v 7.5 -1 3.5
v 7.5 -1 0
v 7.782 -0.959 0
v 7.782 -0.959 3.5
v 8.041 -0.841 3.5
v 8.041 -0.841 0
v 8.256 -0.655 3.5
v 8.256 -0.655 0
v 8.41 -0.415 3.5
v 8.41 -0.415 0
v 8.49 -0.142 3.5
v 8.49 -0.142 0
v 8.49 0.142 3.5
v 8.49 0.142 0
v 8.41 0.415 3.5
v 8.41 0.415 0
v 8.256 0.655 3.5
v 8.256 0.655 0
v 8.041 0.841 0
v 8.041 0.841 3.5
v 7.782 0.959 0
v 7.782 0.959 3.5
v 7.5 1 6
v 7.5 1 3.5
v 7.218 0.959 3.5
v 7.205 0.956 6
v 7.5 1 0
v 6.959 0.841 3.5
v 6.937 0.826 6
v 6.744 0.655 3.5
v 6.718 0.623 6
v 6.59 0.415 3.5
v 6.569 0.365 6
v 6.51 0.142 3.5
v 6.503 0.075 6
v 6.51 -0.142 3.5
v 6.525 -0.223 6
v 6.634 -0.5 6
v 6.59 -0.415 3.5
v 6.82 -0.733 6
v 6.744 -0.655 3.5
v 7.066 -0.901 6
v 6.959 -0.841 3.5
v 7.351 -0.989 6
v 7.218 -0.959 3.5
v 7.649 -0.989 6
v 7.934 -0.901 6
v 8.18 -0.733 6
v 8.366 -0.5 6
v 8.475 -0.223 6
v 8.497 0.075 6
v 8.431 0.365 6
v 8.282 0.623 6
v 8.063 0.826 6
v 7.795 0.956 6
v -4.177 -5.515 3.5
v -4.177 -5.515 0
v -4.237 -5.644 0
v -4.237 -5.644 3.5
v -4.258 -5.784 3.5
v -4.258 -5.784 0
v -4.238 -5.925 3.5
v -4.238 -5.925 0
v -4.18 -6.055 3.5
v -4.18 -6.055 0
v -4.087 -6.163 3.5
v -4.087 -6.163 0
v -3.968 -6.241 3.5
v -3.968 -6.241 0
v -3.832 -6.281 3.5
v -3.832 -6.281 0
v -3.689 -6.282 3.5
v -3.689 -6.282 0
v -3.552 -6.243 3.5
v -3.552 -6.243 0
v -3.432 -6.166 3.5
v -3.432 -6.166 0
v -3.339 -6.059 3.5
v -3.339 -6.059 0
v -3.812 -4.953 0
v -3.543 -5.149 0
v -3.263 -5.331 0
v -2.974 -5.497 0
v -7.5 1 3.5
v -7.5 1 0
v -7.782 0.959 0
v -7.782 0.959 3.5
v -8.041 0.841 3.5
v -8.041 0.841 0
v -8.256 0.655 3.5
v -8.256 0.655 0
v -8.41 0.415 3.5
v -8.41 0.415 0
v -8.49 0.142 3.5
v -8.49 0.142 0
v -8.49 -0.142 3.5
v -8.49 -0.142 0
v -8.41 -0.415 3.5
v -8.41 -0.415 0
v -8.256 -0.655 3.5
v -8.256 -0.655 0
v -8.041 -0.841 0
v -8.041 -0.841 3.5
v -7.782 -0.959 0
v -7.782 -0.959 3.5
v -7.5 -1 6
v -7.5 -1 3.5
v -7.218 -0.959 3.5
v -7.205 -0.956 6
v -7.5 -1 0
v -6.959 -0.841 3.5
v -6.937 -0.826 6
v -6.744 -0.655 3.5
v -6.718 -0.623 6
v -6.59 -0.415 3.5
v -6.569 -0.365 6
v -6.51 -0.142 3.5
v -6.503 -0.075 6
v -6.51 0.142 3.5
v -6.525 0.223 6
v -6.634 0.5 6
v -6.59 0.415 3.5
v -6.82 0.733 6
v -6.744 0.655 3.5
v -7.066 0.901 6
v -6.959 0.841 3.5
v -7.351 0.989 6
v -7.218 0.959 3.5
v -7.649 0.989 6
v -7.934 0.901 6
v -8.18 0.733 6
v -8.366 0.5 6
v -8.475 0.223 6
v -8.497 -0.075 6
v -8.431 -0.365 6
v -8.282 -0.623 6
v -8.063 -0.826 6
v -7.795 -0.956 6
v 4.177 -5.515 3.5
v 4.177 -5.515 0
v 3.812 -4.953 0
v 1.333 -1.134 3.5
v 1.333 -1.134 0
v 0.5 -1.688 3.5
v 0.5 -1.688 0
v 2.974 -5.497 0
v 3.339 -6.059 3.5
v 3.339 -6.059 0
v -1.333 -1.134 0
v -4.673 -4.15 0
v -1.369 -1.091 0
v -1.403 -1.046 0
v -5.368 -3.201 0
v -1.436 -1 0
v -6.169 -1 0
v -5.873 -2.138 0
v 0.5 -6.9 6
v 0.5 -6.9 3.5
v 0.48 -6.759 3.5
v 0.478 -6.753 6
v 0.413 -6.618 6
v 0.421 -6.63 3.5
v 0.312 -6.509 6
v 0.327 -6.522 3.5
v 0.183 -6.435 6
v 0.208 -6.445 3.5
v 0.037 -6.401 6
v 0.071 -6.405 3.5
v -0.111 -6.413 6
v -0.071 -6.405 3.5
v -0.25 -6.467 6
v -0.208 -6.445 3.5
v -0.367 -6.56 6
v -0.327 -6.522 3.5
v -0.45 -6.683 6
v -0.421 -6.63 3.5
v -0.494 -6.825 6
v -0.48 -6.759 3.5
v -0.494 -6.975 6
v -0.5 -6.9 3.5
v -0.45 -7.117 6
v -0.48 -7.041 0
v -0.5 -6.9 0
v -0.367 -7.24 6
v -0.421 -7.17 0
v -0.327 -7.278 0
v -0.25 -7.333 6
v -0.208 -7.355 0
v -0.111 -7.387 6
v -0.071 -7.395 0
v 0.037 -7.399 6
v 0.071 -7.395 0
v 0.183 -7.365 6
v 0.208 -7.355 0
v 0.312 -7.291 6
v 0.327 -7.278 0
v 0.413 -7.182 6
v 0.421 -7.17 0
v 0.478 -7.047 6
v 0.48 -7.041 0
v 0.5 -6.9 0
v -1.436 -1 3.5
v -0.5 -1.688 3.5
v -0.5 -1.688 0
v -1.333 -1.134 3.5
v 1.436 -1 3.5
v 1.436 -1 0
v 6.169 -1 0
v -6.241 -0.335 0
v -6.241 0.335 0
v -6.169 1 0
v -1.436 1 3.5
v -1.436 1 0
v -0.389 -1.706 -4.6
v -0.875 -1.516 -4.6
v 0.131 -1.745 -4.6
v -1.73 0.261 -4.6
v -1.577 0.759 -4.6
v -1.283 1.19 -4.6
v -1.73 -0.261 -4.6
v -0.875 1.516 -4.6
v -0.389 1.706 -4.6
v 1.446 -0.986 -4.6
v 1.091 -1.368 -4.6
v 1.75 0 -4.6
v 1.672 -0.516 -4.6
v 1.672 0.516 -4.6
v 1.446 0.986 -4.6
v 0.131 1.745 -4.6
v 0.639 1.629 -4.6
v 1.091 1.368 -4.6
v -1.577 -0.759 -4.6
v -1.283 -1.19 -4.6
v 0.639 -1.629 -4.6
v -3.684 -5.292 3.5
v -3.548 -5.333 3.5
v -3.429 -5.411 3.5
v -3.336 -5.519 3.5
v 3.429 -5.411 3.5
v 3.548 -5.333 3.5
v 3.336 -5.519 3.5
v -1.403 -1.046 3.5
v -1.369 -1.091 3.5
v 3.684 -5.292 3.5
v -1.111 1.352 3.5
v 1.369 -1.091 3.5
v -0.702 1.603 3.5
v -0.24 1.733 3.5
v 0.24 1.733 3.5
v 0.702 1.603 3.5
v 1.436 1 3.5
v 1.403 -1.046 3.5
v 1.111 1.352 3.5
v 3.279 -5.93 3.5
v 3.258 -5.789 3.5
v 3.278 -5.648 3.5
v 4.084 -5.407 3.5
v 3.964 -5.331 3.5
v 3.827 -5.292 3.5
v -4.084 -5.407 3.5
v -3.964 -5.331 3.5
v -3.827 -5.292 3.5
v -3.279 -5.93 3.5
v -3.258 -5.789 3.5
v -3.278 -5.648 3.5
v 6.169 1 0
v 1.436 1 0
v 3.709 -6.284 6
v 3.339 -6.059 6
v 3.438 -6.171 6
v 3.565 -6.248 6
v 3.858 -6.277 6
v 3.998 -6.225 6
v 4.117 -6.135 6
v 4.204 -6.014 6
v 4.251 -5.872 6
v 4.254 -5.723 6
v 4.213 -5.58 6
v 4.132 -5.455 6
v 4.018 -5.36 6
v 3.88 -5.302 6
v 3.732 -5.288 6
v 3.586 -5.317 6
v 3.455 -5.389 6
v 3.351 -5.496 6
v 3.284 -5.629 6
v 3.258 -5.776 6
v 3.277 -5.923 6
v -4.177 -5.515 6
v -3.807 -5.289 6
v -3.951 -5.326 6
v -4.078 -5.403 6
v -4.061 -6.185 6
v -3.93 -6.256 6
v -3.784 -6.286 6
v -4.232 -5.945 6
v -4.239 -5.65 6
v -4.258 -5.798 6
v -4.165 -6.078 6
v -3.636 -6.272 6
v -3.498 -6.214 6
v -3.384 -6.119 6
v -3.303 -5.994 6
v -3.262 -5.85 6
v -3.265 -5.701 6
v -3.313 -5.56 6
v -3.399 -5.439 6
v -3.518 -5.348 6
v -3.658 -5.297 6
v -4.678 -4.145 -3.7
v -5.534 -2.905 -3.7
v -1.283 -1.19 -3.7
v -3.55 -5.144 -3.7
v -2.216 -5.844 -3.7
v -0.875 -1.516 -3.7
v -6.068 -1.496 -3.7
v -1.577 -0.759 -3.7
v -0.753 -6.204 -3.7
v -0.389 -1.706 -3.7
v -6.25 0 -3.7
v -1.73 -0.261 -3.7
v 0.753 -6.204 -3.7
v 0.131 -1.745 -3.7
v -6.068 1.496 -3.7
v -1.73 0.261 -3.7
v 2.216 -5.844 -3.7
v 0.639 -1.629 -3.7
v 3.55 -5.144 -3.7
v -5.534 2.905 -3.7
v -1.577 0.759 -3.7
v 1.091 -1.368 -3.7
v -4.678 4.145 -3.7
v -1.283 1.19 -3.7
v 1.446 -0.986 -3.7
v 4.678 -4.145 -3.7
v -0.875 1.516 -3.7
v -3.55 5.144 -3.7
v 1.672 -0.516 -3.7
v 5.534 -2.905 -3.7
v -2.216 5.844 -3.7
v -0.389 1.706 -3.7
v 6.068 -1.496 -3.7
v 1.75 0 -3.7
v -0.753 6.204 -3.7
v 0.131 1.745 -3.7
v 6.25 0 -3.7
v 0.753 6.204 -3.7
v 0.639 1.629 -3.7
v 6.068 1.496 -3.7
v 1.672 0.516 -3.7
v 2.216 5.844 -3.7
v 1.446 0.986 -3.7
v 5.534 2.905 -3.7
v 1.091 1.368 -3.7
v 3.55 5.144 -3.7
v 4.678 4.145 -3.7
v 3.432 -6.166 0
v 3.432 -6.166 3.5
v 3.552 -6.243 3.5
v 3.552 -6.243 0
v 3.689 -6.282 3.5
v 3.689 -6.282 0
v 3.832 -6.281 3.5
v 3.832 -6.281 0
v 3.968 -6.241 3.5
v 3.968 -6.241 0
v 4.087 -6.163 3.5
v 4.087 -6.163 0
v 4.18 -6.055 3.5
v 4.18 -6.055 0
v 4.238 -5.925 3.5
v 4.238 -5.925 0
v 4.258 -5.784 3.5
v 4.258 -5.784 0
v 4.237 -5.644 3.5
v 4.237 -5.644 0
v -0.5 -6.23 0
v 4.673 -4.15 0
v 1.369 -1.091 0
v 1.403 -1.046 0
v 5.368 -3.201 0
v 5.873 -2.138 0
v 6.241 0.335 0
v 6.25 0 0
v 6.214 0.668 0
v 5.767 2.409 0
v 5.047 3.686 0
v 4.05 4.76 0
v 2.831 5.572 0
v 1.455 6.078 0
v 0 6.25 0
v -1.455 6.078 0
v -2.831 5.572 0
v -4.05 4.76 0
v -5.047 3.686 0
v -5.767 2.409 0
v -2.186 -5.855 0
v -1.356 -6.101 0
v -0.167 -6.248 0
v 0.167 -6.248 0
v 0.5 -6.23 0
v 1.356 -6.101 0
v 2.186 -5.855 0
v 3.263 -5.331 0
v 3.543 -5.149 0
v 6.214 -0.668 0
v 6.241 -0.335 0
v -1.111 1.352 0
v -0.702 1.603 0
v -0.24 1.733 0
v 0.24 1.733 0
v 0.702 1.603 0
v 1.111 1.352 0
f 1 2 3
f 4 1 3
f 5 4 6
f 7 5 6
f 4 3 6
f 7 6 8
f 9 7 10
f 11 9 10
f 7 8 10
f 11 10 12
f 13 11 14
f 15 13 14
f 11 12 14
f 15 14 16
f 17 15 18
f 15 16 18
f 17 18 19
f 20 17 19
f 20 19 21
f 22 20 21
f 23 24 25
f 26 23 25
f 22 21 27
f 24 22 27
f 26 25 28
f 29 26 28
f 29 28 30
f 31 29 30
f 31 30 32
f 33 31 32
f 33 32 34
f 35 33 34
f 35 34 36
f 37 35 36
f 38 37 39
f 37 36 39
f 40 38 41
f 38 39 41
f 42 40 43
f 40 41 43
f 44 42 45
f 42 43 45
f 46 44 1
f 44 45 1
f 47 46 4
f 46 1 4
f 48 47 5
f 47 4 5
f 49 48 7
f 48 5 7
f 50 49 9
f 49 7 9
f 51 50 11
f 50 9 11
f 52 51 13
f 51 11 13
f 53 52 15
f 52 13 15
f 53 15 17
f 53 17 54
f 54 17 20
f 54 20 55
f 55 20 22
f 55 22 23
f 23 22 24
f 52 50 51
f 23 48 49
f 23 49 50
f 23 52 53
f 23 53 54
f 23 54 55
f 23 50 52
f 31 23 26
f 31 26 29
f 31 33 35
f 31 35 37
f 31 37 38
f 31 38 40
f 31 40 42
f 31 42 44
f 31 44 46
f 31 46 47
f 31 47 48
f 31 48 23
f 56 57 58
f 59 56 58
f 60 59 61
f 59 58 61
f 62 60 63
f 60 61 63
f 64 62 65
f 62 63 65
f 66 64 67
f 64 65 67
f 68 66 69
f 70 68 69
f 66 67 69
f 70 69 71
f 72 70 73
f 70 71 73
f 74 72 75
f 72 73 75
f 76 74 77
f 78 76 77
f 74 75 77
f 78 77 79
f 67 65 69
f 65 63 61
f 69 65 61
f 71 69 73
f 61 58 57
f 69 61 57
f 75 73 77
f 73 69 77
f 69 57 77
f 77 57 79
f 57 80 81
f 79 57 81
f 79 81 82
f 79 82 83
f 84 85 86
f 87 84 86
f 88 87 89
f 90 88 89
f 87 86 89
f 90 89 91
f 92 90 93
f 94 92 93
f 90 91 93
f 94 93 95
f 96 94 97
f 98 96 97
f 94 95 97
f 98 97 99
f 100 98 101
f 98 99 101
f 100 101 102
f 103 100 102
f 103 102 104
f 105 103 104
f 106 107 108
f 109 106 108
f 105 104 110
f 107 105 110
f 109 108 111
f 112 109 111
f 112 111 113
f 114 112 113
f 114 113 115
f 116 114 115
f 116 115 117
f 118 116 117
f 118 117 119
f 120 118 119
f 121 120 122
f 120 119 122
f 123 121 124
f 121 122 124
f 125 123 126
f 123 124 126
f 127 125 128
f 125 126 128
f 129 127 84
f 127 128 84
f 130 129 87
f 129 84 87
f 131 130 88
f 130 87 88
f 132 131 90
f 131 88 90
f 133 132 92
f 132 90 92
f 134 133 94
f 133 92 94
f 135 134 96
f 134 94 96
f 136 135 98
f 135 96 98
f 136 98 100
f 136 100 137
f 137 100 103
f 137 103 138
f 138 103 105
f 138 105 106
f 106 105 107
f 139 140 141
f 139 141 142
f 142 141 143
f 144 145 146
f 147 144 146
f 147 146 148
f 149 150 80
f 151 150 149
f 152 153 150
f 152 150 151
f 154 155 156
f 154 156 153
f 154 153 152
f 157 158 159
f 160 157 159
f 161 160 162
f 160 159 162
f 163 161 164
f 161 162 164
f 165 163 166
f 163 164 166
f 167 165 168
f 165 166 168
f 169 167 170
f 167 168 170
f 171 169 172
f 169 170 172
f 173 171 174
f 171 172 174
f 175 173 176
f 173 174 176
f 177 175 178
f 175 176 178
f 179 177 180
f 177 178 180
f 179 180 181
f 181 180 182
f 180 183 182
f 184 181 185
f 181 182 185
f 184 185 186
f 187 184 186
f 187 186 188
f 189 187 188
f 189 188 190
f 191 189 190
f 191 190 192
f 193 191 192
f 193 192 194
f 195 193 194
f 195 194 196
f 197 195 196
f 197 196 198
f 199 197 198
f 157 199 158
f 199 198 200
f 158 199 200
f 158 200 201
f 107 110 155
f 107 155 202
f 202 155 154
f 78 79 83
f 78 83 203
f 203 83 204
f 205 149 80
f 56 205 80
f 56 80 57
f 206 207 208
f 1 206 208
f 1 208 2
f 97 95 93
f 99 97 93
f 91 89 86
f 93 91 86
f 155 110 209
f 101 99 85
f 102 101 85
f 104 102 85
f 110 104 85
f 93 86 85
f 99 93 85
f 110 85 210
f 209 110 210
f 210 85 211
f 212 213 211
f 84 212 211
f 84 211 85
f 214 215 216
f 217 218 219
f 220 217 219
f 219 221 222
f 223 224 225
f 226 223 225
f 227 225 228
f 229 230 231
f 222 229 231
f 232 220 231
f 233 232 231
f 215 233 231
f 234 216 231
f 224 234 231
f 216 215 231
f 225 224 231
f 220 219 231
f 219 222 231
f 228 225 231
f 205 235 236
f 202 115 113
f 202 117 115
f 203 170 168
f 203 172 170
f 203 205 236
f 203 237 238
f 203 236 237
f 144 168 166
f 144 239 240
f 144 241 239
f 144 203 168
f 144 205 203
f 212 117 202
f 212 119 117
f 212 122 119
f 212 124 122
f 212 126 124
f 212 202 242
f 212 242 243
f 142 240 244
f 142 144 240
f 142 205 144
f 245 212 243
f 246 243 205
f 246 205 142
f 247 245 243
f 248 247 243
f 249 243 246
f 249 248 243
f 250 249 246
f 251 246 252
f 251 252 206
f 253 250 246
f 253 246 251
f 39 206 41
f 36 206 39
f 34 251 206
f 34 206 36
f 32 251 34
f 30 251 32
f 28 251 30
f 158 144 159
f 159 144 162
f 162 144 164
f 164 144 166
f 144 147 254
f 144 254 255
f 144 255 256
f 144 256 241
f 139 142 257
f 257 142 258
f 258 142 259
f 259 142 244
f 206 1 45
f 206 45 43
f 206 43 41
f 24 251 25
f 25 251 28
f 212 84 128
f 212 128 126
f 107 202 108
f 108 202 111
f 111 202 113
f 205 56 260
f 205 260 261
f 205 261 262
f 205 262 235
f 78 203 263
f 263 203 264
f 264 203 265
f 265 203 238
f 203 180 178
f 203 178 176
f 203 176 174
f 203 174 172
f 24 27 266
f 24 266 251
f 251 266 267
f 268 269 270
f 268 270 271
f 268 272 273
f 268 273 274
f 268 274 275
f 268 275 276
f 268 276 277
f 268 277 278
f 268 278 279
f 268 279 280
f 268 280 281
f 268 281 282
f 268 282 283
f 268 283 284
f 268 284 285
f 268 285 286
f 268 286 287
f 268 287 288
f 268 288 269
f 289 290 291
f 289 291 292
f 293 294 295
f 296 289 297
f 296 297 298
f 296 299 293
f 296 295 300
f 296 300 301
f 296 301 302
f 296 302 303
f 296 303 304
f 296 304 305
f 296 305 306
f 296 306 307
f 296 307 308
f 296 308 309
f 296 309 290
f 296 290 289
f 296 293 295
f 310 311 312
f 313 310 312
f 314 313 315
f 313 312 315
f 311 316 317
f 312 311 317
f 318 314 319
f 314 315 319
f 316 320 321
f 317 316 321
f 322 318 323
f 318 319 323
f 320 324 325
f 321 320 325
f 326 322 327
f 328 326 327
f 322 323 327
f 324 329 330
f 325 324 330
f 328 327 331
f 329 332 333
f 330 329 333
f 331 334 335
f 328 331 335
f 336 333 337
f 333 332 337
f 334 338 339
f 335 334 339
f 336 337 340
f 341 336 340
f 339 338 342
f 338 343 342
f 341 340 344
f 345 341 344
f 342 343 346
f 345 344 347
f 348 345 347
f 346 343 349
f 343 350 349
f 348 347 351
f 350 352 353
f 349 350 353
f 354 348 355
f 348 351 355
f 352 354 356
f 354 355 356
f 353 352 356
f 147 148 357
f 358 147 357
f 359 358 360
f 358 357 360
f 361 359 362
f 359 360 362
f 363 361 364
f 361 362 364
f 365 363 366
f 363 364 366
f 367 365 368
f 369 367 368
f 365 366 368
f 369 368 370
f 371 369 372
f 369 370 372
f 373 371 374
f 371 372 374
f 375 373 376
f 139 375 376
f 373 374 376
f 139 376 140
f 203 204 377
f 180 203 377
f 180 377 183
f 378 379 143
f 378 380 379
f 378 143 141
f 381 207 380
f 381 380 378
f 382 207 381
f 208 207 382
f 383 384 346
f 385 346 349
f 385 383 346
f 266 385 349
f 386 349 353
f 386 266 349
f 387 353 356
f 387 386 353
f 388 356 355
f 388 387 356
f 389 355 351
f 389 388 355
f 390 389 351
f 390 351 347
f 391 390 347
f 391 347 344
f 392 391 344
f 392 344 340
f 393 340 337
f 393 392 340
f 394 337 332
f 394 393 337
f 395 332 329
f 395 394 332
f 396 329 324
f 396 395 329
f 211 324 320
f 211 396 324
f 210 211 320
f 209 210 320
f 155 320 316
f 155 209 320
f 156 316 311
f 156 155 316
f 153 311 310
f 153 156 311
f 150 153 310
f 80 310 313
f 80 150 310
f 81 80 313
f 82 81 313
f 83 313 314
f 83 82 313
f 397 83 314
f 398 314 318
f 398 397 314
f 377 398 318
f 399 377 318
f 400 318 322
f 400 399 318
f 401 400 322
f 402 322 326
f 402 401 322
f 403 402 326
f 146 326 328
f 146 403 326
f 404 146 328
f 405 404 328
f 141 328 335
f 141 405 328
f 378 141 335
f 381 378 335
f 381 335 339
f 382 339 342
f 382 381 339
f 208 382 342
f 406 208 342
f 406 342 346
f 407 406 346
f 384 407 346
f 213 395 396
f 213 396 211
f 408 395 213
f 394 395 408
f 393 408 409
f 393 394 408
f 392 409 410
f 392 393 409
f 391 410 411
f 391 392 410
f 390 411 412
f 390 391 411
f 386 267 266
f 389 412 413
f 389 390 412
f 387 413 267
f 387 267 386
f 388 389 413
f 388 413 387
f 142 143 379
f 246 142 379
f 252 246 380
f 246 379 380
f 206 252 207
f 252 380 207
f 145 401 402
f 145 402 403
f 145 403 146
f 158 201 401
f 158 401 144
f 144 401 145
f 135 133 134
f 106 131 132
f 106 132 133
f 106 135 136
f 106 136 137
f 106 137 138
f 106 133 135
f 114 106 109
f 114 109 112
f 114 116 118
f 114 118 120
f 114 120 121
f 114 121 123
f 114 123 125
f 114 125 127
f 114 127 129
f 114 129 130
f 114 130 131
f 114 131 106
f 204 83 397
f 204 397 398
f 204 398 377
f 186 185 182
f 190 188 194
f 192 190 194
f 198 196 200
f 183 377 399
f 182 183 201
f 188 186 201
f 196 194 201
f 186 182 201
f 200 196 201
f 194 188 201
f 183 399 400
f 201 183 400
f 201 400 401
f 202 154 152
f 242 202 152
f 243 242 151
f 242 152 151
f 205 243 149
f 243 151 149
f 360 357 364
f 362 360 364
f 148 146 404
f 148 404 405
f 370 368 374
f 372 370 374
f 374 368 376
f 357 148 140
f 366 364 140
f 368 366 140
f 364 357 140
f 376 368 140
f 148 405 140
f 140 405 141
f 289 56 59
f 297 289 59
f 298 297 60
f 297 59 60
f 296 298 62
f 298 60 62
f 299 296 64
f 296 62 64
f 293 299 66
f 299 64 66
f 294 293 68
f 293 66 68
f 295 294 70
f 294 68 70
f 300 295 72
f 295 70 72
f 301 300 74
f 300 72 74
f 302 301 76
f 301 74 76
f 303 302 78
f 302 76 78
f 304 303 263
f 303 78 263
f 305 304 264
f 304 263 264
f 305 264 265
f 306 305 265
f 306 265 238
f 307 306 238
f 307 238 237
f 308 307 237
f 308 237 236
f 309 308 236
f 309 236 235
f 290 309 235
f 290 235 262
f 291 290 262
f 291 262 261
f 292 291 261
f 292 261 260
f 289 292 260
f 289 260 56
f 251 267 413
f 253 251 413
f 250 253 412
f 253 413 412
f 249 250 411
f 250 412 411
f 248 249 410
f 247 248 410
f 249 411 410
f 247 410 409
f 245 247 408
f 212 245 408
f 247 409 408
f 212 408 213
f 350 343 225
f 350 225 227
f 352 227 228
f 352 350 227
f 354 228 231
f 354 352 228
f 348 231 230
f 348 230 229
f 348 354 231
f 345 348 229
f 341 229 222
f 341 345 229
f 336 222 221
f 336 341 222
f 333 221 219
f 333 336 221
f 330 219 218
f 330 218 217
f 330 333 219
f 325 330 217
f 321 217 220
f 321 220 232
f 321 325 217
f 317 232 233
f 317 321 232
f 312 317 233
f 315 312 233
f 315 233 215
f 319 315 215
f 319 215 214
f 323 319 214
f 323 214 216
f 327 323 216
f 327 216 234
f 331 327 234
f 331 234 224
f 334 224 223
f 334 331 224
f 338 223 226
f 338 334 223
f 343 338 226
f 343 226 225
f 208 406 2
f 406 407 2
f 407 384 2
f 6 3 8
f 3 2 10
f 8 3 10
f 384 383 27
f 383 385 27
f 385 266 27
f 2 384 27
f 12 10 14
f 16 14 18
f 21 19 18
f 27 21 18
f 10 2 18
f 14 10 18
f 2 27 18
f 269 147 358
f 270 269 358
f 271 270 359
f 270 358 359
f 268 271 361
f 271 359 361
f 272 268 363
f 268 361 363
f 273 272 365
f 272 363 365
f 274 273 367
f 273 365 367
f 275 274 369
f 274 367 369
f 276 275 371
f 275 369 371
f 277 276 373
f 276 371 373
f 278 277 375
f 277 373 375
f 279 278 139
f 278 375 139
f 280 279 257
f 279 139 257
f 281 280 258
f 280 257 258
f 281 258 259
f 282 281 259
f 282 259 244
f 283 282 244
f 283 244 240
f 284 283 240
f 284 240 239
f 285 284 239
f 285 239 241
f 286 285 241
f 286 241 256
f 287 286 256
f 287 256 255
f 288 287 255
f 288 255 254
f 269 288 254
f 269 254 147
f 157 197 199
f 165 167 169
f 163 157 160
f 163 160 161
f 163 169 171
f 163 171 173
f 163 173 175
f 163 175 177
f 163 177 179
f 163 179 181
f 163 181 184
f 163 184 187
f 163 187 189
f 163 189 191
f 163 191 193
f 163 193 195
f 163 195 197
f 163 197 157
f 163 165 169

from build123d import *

# Parameters (mm, degrees)
SUPPORT_DEPTH              = 3.5
MAIN_FEATURES_SKETCH_3_R   = 6.25
KNOB_DEPTH                 = 3.7
SHAFT_START                = -3.7
MAIN_FEATURES_SKETCH_4_R   = 1.75
SHAFT_DEPTH                = 0.9
LEGS_START                 = 3.5
MAIN_FEATURES_SKETCH_5_R   = 1
MAIN_FEATURES_SKETCH_5_R_2 = 0.5
LEGS_DEPTH                 = 2.5


with BuildPart() as part:
    # main_features_sketch → support (new body)
    with BuildSketch(Plane.XY):
        with BuildLine():
            Line((0.5, -6.9), (0.5, -1.687971711))
            Line((0.5, -1.687971711), (3.338674058, -6.059146436))
            ThreePointArc((3.338674058, -6.059146436), (4.030328859, -6.206162203), (4.177344626, -5.514507401))
            Line((4.177344626, -5.514507401), (1.332722713, -1.134173783))
            ThreePointArc((1.332722713, -1.134173783), (1.386056185, -1.068339015), (1.436140662, -1))
            Line((1.436140662, -1), (7.5, -1))
            ThreePointArc((7.5, -1), (8.5, 0), (7.5, 1))
            Line((7.5, 1), (1.436140662, 1))
            ThreePointArc((1.436140662, 1), (0, 1.75), (-1.436140662, 1))
            Line((-1.436140662, 1), (-7.5, 1))
            ThreePointArc((-7.5, 1), (-8.5, 0), (-7.5, -1))
            Line((-7.5, -1), (-1.436140662, -1))
            ThreePointArc((-1.436140662, -1), (-1.386056185, -1.068339015), (-1.332722713, -1.134173783))
            Line((-1.332722713, -1.134173783), (-4.177344626, -5.514507401))
            ThreePointArc((-4.177344626, -5.514507401), (-4.030328859, -6.206162203), (-3.338674058, -6.059146436))
            Line((-3.338674058, -6.059146436), (-0.5, -1.687971711))
            Line((-0.5, -1.687971711), (-0.5, -6.9))
            ThreePointArc((-0.5, -6.9), (0, -7.4), (0.5, -6.9))
        make_face()
    extrude(amount=SUPPORT_DEPTH)

    # main_features_sketch<3> → knob (add)
    with BuildSketch(Plane.XY):
        Circle(MAIN_FEATURES_SKETCH_3_R)
    extrude(amount=-KNOB_DEPTH)

    # main_features_sketch<4> → shaft (add)
    with BuildSketch(Plane.XY.offset(SHAFT_START)):
        Circle(MAIN_FEATURES_SKETCH_4_R)
    extrude(amount=-SHAFT_DEPTH)

    # main_features_sketch<5> → legs (add)
    with BuildSketch(Plane.XY.offset(LEGS_START)):
        with Locations(Location((-7.5, 0, 0), (0, 0, 270))):
            Circle(MAIN_FEATURES_SKETCH_5_R)
        with Locations(Location((-3.758009342, -5.786826919, 0), (0, 0, 147))):
            Circle(MAIN_FEATURES_SKETCH_5_R_2)
        with Locations((0, -6.9)):
            Circle(MAIN_FEATURES_SKETCH_5_R_2)
        with Locations(Location((3.758009342, -5.786826919, 0), (0, 0, 213))):
            Circle(MAIN_FEATURES_SKETCH_5_R_2)
        with Locations(Location((7.5, 0, 0), (0, 0, 90))):
            Circle(MAIN_FEATURES_SKETCH_5_R)
    extrude(amount=LEGS_DEPTH)


solid = part.part
